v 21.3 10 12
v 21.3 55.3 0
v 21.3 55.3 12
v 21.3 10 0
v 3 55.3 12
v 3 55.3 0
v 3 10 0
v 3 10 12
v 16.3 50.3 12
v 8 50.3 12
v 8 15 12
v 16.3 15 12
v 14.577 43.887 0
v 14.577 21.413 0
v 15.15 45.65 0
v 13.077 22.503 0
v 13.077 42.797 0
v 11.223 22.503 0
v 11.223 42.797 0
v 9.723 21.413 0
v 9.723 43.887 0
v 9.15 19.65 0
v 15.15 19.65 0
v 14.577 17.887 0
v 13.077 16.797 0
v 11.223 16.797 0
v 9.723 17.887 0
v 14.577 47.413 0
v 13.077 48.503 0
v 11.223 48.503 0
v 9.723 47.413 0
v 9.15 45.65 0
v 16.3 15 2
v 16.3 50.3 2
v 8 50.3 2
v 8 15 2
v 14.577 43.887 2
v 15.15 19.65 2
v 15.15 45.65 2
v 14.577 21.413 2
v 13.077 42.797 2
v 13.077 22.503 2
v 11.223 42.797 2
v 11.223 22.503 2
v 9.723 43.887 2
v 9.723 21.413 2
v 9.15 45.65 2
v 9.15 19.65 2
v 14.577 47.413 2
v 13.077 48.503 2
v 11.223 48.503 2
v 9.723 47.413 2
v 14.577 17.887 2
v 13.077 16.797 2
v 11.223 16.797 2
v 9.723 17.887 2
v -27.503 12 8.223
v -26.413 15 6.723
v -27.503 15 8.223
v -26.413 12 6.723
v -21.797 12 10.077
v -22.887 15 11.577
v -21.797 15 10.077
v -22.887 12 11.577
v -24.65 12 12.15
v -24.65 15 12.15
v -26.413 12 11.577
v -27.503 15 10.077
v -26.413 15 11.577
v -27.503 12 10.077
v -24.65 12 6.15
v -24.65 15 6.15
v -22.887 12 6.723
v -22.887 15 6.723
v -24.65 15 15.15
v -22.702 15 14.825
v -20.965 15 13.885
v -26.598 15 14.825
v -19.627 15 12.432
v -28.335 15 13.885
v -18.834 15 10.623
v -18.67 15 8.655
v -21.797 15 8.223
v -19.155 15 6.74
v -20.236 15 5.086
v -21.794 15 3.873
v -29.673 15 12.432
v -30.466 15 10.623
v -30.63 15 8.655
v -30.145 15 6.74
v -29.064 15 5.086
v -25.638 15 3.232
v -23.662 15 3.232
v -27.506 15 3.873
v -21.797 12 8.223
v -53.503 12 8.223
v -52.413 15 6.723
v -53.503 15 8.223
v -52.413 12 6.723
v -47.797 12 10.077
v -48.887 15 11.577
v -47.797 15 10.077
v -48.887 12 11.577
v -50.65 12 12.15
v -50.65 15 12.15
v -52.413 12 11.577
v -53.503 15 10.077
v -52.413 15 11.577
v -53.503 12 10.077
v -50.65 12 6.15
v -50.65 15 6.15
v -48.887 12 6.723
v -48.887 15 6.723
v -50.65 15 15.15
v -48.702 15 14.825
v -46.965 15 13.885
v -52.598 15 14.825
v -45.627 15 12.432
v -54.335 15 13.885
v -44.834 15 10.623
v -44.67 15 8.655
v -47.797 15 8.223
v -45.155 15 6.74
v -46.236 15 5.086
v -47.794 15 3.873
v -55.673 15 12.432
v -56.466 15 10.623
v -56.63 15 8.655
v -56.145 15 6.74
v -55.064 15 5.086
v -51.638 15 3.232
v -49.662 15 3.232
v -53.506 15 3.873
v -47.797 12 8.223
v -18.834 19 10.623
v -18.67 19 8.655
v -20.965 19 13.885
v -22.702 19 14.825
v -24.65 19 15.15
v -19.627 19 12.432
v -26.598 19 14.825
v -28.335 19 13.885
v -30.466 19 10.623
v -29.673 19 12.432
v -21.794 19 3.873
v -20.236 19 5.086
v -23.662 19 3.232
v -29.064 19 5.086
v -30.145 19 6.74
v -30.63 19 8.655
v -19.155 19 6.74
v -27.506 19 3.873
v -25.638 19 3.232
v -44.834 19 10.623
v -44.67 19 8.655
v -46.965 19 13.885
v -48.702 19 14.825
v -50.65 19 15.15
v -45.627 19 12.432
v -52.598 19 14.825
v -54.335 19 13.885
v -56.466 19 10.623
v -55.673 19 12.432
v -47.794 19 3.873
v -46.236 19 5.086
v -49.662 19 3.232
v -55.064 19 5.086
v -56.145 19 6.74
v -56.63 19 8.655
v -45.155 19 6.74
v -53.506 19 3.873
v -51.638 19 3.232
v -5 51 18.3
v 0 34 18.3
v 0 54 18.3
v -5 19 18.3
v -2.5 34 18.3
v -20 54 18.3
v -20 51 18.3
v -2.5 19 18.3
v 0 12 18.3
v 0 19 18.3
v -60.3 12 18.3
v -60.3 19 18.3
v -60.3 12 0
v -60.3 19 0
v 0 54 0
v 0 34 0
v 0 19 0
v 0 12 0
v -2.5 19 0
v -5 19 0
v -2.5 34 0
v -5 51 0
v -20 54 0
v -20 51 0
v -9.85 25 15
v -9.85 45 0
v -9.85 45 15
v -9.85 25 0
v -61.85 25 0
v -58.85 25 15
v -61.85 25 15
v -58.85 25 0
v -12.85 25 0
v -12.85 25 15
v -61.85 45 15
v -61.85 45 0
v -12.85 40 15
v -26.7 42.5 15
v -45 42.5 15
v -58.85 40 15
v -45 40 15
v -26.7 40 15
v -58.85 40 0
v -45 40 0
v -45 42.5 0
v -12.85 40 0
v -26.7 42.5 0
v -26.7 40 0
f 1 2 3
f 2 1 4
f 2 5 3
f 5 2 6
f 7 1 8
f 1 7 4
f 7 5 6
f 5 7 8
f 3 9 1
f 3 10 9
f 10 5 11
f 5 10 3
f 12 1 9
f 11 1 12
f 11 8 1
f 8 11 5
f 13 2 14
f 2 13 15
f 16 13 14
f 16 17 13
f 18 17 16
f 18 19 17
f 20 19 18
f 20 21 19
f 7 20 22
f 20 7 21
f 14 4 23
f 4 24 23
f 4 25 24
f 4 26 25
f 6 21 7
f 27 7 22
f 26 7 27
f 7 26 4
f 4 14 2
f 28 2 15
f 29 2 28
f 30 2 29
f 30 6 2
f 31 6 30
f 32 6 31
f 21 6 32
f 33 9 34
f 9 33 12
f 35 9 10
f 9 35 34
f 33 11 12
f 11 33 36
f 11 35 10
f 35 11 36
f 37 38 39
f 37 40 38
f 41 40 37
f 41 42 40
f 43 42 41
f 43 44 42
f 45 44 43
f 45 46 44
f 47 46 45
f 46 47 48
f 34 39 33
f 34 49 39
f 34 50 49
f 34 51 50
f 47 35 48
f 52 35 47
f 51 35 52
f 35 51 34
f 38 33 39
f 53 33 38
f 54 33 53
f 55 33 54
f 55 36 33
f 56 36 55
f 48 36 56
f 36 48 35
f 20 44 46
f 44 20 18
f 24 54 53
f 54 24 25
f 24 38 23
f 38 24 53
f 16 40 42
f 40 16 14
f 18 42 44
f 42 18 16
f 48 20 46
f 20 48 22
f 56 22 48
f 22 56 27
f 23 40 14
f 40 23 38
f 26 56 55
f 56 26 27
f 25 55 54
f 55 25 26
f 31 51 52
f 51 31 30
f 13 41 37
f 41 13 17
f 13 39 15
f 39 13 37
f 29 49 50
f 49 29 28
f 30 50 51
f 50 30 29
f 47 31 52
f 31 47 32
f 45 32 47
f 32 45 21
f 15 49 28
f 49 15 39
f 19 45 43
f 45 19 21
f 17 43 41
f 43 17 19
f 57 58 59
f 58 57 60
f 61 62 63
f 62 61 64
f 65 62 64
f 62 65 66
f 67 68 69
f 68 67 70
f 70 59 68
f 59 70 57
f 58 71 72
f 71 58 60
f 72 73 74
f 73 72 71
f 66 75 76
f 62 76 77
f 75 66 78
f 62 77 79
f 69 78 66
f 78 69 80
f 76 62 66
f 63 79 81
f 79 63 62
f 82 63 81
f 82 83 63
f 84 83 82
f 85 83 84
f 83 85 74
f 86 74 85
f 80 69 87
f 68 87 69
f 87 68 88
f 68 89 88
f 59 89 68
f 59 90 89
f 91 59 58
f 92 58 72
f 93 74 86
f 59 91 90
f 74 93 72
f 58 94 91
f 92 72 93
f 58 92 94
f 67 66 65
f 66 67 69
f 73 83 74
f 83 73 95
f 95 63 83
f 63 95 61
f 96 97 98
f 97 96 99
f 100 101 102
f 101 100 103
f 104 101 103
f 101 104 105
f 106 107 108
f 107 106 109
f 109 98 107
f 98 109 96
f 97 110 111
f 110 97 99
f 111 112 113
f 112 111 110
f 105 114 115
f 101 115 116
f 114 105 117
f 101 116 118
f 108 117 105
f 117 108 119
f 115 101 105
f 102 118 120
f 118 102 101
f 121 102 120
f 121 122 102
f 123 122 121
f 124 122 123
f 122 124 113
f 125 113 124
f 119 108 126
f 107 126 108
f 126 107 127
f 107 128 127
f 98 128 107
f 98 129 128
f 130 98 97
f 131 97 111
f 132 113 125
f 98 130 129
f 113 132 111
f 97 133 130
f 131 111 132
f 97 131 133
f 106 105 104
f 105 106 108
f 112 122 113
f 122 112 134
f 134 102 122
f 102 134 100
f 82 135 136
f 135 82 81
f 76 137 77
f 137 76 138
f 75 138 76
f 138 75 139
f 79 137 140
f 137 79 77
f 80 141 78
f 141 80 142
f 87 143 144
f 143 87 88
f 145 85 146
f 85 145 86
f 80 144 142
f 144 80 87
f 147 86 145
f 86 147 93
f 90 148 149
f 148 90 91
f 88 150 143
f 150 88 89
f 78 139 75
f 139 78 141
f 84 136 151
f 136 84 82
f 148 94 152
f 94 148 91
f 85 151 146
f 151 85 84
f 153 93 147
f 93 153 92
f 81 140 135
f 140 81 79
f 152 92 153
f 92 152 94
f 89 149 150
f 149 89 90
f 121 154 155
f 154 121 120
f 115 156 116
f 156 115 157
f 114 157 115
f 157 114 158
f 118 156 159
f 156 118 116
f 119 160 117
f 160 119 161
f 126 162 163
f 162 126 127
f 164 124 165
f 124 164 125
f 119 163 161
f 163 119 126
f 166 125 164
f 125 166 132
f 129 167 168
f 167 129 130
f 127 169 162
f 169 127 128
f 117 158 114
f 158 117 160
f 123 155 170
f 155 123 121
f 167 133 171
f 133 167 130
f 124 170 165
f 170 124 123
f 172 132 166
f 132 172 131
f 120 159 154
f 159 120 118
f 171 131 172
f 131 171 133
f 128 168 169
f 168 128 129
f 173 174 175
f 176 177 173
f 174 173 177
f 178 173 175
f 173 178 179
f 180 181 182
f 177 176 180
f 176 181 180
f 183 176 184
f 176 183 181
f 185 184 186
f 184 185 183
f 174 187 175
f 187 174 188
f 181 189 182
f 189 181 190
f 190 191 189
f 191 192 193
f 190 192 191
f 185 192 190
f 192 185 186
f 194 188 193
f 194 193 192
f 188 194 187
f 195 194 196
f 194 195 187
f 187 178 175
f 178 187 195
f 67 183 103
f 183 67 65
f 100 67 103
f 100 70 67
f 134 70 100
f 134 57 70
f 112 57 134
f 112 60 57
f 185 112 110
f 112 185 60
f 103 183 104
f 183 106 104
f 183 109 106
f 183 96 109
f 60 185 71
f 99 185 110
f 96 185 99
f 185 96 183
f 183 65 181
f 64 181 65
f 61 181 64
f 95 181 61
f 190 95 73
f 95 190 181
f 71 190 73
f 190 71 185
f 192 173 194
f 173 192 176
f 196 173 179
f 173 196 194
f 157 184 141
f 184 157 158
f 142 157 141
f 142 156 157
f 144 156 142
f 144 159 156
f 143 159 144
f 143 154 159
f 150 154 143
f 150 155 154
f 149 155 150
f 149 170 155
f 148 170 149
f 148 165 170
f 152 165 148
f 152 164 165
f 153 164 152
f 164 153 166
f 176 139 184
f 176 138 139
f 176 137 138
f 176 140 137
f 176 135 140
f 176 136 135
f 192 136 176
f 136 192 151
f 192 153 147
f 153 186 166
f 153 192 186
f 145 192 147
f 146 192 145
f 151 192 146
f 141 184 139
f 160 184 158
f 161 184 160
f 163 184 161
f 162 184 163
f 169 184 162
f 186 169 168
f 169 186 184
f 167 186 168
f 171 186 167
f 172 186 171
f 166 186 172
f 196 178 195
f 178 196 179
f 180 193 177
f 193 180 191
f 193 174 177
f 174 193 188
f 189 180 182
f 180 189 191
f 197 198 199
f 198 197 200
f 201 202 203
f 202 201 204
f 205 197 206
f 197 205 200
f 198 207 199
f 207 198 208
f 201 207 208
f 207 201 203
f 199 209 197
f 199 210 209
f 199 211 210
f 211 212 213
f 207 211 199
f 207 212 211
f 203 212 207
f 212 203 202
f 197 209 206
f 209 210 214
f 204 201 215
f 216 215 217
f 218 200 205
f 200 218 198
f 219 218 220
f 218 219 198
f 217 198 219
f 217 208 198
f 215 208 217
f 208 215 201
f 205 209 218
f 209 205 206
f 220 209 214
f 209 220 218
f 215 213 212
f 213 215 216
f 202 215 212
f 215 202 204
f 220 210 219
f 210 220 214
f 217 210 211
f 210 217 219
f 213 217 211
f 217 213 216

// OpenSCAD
//afmetingen uitsparing:
//x,y,z
uitsparing=[8.3,10.0,35.3];
// rand rond de uitsparing
rand=5;
//positie blok links onder vooraan
orig=[0,0,0];
// tussenstuk dikte, verbreding
ts=[15,10];
//helling steun
hel=10;
//afmetingen ruit:
//onder,boven,vertikaal,dikte
ruit=[68,49,69,11];
// afstand tussen boorgaten, diameter en diepte boorgat, diam. kopgat
bg = [26,3,5,6];

translate([3,10,(uitsparing[1])+2]) rotate([-90,0,0]) batt_holder_p0();
rotate([0,-90,0]) translate([0,0,15]) batt_holder_p1();
translate([-45,30,-19]) rotate([90,0,0]) /*translate([0,0,15])*/ batt_holder_p2();

module batt_holder_p0(){
    difference() {
      union() {
        basissteun();
        //tussen();
        //steun();
      }
      boorgaten();
      kopgaten();
    }    
}

module batt_holder_p1() {
    steun3=[uitsparing[0]+rand*2,7+35,uitsparing[2]+rand*2+15];
    vyrez3=-23+(uitsparing[0]+rand*2)/2;    
    
    difference(){
        translate([0,12,-15]) cube(steun3);
        
        translate([vyrez3,19,-10]) cube([46,32,70]);
        translate([vyrez3,19,5]) cube([46,40,70]);
        
        translate([0,19,-15]) cube([uitsparing[0]+rand*2,15,2.5]);
        
        boorgaten();
        kopgaten();
    }
}

module batt_holder_p2(){
    steun3=[uitsparing[0]+rand*2,7+35,uitsparing[2]+rand*2+15];
    vyrez3=-23+(uitsparing[0]+rand*2)/2;    
    
    difference(){
        translate([-26+(uitsparing[0]+rand*2)/2,19,-15]) cube([52,15,20]);
        
        translate([vyrez3,19,-10]) cube([46,32,70]);
        translate([vyrez3,19,5]) cube([46,40,70]);
        translate([0,19,-12.5]) cube([uitsparing[0]+rand*2,15,2.5]);
    }
}

module basissteun() {
    
 steun=[uitsparing[0]+rand*2,uitsparing[1],uitsparing[2]+rand*2];
    steun2=[uitsparing[0]+rand*2,2,uitsparing[2]+rand*2];
    
 uitsppos=[orig[0]+rand,orig[1],orig[2]+rand];
    
//  difference() {   
//    translate(orig) cube(steun);
//    translate(uitsppos) cube(uitsparing);
//  }

  translate(orig) {
    difference(){
        union(){
            cube(steun);
            translate([0,10,0]) cube(steun2);
        }
        
      translate(uitsppos)cube(uitsparing);
    }  
  }

}

module tussen() {
  x=orig[0]-ts[1];
  y=orig[1]+uitsparing[1];
  z=orig[2];
  lv=orig[0];
  rv=orig[0]+(rand*2)+uitsparing[0];
  onderl=x;
  onderr=x+rand*2+ts[1]*2+uitsparing[0];
  bovenl=x;
  bovenr=x+rand*2+ts[1]*2+uitsparing[0];
  
  hoogte=uitsparing[2]+rand*2;
  dik=ts[0];
  points=[
      [lv,y,z], 
      [rv,y,z],
      [lv,y,z+hoogte],
      [rv,y,z+hoogte],
      [onderl,y+dik,z],
      [onderr,y+dik,z],
      [bovenl,y+hel+dik,z+hoogte],
      [bovenr,y+hel+dik,z+hoogte]];
  faces=[
      [0,1,5,4],
      [2,3,1,0],
      [3,7,5,1],
      [7,6,4,5],
      [6,2,0,4],
      [7,3,2,6]];
  polyhedron(points,faces, convexity = 10);
}

module steun() {
  //positie ruit links onder vooraan
  p0=(uitsparing[0]/2)+rand;
  p1=ruit[0]/2;
  //echo(p0, p1);
  ruitpos=[orig[0]+p0-p1,orig[1]+uitsparing[1]+ts[0],orig[2]];
  x=0;
  y=0;
  z=0;
  onderl=x;
  onderr=x+ruit[0];
  bovenl=x-((ruit[1]-ruit[0])/2);
  bovenr=x+((ruit[1]-ruit[0])/2)+ruit[0];
  hoogte=ruit[2];
  dik=ruit[3];
  points=[
      [onderl,y,z], 
      [onderr,y,z],
      [bovenl,y,z+hoogte],
      [bovenr,y,z+hoogte],
      [onderl,y+dik,z],
      [onderr,y+dik,z],
      [bovenl,y+dik,z+hoogte],
      [bovenr,y+dik,z+hoogte]];
  faces=[
      [0,1,5,4],
      [2,3,1,0],
      [3,7,5,1],
      [7,6,4,5],
      [6,2,0,4],
      [7,3,2,6]];
  translate (ruitpos) rotate ([-hel,0,0])
    polyhedron(points,faces, convexity = 10);
}

module boorgaten() {
  tussengaten=bg[0];
  ho = orig[2]+rand+uitsparing[2]/2+tussengaten/2;
  la = orig[2]+rand+uitsparing[2]/2-tussengaten/2;
  xpos = orig[0]+rand+uitsparing[0]/2;
  ypos = orig[1]+uitsparing[1];
  translate([xpos,ypos,la]) {
    rotate([-90,0,0]) {
      cylinder(h=bg[2],r=bg[1], center=false);
    }
  }
  translate([xpos,ypos,ho]) {
    rotate([-90,0,0]) {
      cylinder(h=bg[2],r=bg[1], center=false);
    }
  }
}

module kopgaten() {
  tussengaten=bg[0];
  ho = orig[2]+rand+uitsparing[2]/2+tussengaten/2;
  la = orig[2]+rand+uitsparing[2]/2-tussengaten/2;
  xpos = orig[0]+rand+uitsparing[0]/2;
  ypos = orig[1]+uitsparing[1]+bg[2];
  hog = ts[0]+ruit[3]+hel-bg[2];
  translate([xpos,ypos,la]) {
    rotate([-90,0,0]) {
      cylinder(h=hog,r=bg[3], center=false);
    }
  }
  translate([xpos,ypos,ho]) {
    rotate([-90,0,0]) {
      cylinder(h=hog,r=bg[3], center=false);
    }
  }
}
